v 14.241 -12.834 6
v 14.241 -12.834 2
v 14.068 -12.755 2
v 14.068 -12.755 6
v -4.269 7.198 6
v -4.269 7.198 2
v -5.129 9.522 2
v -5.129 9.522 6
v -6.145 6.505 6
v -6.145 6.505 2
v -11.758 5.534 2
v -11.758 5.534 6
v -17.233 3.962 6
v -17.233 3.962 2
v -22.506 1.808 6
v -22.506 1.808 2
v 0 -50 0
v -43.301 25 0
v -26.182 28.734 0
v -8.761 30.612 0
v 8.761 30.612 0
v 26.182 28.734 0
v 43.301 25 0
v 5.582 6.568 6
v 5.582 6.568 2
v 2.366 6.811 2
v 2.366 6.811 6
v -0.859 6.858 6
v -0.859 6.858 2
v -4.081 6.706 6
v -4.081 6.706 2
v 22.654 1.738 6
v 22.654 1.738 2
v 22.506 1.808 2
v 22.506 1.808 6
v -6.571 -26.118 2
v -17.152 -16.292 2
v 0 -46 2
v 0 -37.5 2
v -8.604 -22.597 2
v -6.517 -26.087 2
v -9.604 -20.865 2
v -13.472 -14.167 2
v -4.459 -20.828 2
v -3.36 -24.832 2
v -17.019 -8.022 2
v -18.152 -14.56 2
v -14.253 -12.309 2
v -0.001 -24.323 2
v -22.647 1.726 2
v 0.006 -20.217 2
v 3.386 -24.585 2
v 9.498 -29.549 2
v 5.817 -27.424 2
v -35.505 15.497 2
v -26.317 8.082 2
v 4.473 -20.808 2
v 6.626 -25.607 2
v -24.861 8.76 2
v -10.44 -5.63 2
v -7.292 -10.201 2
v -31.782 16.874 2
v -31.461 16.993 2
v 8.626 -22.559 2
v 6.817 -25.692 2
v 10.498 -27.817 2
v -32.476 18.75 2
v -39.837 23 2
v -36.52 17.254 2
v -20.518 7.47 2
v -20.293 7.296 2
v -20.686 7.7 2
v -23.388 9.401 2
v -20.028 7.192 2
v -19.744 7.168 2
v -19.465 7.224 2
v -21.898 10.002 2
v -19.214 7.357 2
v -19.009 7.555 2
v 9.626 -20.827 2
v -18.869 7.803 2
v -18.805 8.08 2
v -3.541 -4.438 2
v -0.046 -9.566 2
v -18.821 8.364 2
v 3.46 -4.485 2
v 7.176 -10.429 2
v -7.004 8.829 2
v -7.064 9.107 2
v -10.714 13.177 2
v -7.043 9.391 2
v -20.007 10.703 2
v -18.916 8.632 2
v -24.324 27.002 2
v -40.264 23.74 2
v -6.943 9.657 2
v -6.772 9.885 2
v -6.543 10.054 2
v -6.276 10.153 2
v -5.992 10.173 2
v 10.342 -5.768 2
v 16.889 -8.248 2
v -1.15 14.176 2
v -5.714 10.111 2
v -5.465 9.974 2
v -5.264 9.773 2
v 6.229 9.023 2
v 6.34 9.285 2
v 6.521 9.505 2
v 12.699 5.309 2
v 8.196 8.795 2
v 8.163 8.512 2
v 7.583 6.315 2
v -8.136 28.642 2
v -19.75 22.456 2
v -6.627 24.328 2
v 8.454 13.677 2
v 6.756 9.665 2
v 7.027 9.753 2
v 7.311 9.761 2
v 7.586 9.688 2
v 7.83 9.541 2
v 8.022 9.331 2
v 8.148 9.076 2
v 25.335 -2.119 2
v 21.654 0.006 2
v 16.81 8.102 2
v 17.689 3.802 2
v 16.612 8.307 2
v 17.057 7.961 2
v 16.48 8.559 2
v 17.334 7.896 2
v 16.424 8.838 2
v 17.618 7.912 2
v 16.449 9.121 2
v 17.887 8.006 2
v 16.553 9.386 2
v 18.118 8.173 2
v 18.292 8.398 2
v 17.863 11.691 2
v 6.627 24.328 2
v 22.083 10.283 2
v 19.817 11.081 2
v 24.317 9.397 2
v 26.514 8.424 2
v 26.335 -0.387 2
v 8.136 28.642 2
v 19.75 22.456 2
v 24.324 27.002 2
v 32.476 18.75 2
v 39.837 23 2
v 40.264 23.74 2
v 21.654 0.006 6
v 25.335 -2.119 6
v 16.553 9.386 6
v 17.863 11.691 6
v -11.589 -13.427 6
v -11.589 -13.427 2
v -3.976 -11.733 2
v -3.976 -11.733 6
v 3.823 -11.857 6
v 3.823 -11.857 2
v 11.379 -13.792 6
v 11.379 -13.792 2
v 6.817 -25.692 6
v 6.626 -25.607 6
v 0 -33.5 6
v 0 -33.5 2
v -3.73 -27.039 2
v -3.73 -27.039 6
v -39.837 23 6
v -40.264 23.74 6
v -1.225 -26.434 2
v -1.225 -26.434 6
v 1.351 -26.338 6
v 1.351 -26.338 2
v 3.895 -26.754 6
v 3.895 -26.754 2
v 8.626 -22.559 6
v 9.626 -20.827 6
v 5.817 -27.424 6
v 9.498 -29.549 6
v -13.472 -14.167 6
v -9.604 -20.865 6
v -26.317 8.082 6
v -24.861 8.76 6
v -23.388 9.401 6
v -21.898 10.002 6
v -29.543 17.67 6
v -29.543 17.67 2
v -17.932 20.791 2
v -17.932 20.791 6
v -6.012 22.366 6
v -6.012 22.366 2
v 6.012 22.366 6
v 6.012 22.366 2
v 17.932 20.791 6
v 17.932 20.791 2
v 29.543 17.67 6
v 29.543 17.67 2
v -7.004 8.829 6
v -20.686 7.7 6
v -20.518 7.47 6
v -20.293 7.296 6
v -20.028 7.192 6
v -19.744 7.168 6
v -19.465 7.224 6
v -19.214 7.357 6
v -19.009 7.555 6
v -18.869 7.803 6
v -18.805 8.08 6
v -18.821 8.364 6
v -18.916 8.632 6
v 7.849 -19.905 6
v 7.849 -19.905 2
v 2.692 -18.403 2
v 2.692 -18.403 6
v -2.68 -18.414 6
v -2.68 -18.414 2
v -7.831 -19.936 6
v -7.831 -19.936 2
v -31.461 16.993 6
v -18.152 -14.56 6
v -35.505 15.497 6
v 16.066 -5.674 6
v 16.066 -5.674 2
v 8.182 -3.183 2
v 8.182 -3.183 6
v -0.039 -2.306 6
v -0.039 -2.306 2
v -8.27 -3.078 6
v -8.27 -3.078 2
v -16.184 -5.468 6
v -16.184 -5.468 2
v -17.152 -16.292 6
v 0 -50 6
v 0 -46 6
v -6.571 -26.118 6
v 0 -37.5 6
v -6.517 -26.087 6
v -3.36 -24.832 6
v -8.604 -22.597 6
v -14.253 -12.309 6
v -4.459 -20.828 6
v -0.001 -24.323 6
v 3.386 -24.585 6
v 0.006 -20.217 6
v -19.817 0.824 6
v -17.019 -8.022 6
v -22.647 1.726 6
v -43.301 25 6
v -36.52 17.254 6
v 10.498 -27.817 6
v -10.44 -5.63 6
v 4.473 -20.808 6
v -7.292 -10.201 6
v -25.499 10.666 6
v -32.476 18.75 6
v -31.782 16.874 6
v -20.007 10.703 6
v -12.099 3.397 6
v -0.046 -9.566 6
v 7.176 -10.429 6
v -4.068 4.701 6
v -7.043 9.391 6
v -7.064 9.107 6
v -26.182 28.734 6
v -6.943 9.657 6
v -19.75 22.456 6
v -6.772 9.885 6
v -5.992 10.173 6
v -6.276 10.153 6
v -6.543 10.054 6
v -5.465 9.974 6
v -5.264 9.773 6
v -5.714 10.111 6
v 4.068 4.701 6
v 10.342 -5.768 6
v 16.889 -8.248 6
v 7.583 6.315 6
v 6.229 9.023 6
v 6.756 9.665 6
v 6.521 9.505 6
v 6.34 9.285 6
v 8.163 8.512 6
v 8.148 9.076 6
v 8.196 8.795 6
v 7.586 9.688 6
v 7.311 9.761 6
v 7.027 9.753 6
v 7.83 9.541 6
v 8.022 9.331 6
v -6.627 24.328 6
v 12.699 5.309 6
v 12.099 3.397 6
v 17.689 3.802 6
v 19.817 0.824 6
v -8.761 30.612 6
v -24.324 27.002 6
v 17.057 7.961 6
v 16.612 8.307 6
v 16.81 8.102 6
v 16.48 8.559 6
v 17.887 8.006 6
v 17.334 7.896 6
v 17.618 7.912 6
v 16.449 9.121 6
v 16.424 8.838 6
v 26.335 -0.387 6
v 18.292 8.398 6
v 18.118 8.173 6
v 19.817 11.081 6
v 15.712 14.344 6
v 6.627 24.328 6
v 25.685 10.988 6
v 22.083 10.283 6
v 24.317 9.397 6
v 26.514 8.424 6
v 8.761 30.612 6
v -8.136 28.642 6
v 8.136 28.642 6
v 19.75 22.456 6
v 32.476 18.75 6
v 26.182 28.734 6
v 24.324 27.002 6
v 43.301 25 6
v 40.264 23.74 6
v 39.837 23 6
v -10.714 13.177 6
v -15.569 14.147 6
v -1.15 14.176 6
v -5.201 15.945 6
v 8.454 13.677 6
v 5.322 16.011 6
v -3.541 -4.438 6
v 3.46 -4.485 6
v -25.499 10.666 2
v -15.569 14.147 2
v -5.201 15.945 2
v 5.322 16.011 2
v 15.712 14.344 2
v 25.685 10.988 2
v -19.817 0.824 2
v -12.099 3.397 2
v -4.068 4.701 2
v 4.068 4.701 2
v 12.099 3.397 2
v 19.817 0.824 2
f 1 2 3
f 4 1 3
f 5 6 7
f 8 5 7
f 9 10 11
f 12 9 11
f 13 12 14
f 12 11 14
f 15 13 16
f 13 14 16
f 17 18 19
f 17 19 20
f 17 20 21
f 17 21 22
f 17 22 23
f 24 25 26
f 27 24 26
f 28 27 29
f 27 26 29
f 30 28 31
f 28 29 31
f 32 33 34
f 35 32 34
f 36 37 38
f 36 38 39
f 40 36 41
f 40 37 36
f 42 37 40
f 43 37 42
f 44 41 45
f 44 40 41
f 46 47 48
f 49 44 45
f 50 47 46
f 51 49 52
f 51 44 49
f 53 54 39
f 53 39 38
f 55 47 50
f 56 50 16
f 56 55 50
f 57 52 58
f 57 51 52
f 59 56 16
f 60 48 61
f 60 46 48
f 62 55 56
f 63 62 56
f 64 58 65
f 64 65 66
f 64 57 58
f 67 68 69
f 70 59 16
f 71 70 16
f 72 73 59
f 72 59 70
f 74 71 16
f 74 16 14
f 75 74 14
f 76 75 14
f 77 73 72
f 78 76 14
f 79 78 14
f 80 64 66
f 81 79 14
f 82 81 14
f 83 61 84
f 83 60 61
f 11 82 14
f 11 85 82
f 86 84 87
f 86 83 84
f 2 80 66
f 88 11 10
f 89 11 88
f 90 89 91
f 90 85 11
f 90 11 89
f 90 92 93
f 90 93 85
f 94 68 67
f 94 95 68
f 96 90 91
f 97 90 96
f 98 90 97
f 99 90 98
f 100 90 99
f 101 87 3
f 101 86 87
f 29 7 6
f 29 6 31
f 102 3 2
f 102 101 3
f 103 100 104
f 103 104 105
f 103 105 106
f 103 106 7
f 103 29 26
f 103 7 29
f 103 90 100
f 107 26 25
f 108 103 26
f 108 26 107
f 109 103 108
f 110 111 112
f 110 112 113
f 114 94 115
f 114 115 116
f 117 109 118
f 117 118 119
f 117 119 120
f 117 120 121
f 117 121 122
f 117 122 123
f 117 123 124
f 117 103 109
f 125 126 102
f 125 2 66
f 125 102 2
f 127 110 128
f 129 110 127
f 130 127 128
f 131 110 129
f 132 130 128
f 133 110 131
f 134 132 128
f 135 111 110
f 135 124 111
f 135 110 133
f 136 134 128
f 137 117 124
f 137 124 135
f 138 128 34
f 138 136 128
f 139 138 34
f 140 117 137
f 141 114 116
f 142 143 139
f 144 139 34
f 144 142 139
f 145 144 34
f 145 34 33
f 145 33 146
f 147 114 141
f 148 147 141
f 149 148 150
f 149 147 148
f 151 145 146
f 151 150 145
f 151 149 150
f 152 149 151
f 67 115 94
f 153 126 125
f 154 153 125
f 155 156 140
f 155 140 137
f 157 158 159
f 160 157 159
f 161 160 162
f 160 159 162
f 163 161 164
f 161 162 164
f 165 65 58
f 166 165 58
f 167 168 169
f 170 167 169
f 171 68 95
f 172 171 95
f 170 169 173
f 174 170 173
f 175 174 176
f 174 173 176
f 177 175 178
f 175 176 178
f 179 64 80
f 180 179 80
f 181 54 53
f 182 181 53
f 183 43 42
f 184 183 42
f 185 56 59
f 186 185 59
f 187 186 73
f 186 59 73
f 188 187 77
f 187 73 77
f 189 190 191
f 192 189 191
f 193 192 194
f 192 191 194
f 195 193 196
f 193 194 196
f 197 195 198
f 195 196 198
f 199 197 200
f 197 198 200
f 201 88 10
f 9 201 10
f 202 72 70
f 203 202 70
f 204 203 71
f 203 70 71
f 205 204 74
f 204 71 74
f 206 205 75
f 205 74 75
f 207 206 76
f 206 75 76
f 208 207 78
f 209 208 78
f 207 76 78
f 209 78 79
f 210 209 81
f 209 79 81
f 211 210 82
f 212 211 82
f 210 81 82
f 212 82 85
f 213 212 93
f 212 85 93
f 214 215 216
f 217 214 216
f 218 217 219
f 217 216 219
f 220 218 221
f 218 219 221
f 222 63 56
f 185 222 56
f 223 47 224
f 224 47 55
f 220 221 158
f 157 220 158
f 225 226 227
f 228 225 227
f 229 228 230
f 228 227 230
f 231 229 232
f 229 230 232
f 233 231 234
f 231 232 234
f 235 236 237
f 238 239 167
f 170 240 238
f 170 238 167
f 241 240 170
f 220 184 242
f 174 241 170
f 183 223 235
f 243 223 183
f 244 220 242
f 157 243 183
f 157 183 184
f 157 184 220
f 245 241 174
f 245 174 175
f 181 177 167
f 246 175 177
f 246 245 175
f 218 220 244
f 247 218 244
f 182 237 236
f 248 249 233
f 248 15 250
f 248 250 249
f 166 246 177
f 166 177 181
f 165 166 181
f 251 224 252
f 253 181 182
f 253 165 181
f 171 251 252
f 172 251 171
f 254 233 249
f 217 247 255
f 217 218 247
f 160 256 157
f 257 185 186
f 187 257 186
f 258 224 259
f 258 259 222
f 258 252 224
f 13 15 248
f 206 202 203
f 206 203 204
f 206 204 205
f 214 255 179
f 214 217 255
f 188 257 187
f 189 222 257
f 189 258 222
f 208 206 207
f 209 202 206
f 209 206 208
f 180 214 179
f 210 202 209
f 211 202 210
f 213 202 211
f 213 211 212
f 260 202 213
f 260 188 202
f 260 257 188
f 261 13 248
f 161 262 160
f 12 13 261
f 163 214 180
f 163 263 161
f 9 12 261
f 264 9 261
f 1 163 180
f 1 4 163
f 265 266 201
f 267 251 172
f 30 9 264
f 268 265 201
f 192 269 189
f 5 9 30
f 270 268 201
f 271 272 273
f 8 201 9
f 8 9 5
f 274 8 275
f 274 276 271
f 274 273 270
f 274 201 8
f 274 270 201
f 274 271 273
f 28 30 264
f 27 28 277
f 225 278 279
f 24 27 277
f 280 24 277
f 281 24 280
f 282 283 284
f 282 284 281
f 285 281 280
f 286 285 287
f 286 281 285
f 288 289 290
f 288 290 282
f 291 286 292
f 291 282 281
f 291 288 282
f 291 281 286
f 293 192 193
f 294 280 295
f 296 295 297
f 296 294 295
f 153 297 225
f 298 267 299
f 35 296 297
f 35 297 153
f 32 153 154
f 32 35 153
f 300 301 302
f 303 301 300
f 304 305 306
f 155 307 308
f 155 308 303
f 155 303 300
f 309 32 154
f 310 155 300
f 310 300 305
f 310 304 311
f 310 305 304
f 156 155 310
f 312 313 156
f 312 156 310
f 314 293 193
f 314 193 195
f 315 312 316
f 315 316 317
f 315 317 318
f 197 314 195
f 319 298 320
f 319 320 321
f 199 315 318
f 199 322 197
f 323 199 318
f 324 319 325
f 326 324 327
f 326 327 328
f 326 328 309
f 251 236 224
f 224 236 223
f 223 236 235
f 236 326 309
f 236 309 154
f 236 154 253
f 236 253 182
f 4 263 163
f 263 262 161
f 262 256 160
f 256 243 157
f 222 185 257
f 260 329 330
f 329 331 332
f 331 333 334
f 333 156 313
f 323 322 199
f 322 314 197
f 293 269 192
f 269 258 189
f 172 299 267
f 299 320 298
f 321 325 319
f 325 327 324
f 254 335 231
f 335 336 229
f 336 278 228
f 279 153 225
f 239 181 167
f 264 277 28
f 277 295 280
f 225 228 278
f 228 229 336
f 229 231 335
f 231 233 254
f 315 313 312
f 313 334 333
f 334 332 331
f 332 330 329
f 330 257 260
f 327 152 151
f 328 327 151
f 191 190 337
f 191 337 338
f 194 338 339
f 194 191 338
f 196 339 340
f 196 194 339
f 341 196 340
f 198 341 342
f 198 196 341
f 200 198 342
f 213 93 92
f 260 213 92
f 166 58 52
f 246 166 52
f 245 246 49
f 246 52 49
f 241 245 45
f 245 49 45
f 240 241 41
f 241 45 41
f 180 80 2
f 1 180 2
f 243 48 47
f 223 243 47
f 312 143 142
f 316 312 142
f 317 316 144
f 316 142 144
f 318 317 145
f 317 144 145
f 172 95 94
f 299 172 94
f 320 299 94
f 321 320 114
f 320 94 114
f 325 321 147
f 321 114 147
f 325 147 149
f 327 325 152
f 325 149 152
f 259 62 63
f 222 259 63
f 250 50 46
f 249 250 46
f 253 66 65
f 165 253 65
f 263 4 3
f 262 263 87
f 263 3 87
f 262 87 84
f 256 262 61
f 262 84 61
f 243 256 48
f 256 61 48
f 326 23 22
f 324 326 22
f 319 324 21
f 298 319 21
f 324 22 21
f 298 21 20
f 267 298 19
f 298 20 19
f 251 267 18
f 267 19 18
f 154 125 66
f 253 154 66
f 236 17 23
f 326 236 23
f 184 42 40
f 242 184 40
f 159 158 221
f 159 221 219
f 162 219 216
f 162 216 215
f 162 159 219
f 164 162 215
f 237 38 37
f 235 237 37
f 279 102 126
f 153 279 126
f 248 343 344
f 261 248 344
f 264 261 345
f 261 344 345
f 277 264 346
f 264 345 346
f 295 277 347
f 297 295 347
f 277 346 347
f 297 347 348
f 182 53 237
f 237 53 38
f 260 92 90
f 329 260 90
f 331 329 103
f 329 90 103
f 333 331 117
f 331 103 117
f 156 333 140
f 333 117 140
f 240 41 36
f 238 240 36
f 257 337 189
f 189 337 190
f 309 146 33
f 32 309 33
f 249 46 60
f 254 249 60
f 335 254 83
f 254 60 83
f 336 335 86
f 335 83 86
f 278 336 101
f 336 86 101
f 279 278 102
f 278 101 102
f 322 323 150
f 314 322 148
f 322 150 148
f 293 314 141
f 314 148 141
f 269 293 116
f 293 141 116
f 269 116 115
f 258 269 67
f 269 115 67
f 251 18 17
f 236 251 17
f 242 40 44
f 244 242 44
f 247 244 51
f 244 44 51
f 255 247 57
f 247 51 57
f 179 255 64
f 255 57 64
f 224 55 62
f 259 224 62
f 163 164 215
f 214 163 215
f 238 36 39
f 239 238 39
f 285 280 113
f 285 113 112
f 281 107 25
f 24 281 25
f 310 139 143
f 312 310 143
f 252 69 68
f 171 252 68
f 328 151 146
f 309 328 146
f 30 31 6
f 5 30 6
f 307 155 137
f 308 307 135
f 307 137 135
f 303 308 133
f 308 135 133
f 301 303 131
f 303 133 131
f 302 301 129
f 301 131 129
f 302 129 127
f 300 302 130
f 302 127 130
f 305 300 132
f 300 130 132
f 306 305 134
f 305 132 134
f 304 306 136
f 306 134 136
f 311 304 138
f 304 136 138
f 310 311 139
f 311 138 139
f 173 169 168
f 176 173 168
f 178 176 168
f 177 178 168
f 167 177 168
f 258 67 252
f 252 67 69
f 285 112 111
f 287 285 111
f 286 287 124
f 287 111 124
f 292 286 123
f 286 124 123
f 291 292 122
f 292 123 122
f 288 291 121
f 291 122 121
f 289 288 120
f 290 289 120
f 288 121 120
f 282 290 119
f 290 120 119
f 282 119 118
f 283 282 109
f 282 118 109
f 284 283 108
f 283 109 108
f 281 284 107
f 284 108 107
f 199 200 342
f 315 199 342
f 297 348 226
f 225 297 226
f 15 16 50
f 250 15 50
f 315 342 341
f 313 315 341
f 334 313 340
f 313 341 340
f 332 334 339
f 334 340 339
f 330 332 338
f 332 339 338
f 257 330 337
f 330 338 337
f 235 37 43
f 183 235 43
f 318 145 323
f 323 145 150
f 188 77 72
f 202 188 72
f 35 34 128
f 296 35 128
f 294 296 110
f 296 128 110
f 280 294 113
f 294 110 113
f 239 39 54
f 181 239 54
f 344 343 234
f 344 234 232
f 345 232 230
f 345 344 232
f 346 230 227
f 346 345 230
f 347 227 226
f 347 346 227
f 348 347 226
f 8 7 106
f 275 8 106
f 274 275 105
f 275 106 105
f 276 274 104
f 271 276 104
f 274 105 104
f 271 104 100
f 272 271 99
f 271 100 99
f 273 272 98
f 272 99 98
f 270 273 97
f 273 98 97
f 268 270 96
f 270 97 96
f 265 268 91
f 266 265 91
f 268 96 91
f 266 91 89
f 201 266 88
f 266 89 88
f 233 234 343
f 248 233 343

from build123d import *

# Parameters (mm, degrees)
F1_DEPTH = 6
F3_DEPTH = 2


with BuildPart() as f1:
    # F0 (on Top) → F1 (new body)
    with BuildSketch(Plane.XY):
        with BuildLine():
            Line((-43.30127, 25), (0, -50))
            Line((0, -50), (43.30127, 25))
            ThreePointArc((43.30127, 25), (0, 30.847641), (-43.30127, 25))
        make_face()
        with BuildLine():
            ThreePointArc((-11.589333, -13.426687), (-0.072865, -11.565377), (11.378667, -13.79157))
            Line((11.378667, -13.79157), (7.849282, -19.904644))
            ThreePointArc((7.849282, -19.904644), (0.005562, -18.216828), (-7.831448, -19.935535))
            Line((-7.831448, -19.935535), (-11.589333, -13.426687))
        make_face(mode=Mode.SUBTRACT)
        with BuildLine():
            ThreePointArc((-3.730163, -27.039168), (0.060809, -26.321755), (3.894771, -26.754059))
            Line((3.894771, -26.754059), (0, -33.5))
            Line((0, -33.5), (-3.730163, -27.039168))
        make_face(mode=Mode.SUBTRACT)
        with BuildLine():
            Line((9.497942, -29.549082), (0, -46))
            Line((0, -46), (-17.152136, -16.291628))
            Line((-17.152136, -16.291628), (-13.471529, -14.166628))
            Line((-13.471529, -14.166628), (-9.604325, -20.864822))
            Line((-9.604325, -20.864822), (-8.604242, -22.597016))
            ThreePointArc((-8.604242, -22.597016), (0.00573, -20.216832), (8.626059, -22.559227))
            Line((8.626059, -22.559227), (9.626098, -20.82711))
            Line((9.626098, -20.82711), (14.241089, -12.833711))
            Line((14.241089, -12.833711), (14.067922, -12.754568))
            ThreePointArc((14.067922, -12.754568), (-0.045906, -9.565553), (-14.253164, -12.308505))
            Line((-14.253164, -12.308505), (-18.152136, -14.559577))
            Line((-18.152136, -14.559577), (-35.505424, 15.497198))
            Line((-35.505424, 15.497198), (-31.782206, 16.874176))
            Line((-31.782206, 16.874176), (-31.461437, 16.992808))
            Line((-31.461437, 16.992808), (-26.316707, 8.081874))
            ThreePointArc((-26.316707, 8.081874), (-24.126261, 9.085191), (-21.898303, 10.0022))
            Line((-21.898303, 10.0022), (-20.685559, 7.700137))
            ThreePointArc((-20.685559, 7.700137), (-19.334733, 7.281486), (-18.916081, 8.632312))
            Line((-18.916081, 8.632312), (-20.006684, 10.702522))
            ThreePointArc((-20.006684, 10.702522), (-1.149596, 14.176087), (17.863047, 11.691171))
            Line((17.863047, 11.691171), (16.553134, 9.386264))
            ThreePointArc((16.553134, 9.386264), (16.928445, 8.022761), (18.291948, 8.398071))
            Line((18.291948, 8.398071), (19.816809, 11.081198))
            ThreePointArc((19.816809, 11.081198), (23.204445, 9.850646), (26.514425, 8.424332))
            Line((26.514425, 8.424332), (32.475953, 18.75))
            ThreePointArc((32.475953, 18.75), (0, 24.562976), (-32.475953, 18.75))
            Line((-32.475953, 18.75), (-36.519939, 17.25439))
            Line((-36.519939, 17.25439), (-39.837169, 23))
            Line((-39.837169, 23), (-40.264169, 23.739586))
            ThreePointArc((-40.264169, 23.739586), (0, 28.847641), (40.264169, 23.739586))
            Line((40.264169, 23.739586), (39.837169, 23))
            Line((39.837169, 23), (26.334579, -0.387172))
            Line((26.334579, -0.387172), (22.653971, 1.737828))
            Line((22.653971, 1.737828), (22.506193, 1.807767))
            ThreePointArc((22.506193, 1.807767), (15.212654, 4.617264), (7.583376, 6.315231))
            Line((7.583376, 6.315231), (8.163141, 8.512388))
            ThreePointArc((8.163141, 8.512388), (7.451374, 9.734431), (6.229331, 9.022663))
            Line((6.229331, 9.022663), (5.581544, 6.567719))
            ThreePointArc((5.581544, 6.567719), (0.753566, 6.859231), (-4.080781, 6.706128))
            Line((-4.080781, 6.706128), (-4.26912, 7.198283))
            Line((-4.26912, 7.198283), (-5.12863, 9.522317))
            ThreePointArc((-5.12863, 9.522317), (-6.413415, 10.113356), (-7.004454, 8.828571))
            Line((-7.004454, 8.828571), (-6.144944, 6.504537))
            ThreePointArc((-6.144944, 6.504537), (-14.516777, 4.82223), (-22.506193, 1.807767))
            Line((-22.506193, 1.807767), (-22.647311, 1.726292))
            Line((-22.647311, 1.726292), (-17.019315, -8.021681))
            ThreePointArc((-17.019315, -8.021681), (-0.039752, -4.305799), (16.88873, -8.247861))
            Line((16.88873, -8.247861), (21.653971, 0.005778))
            Line((21.653971, 0.005778), (25.334579, -2.119222))
            Line((25.334579, -2.119222), (10.497942, -27.817031))
            Line((10.497942, -27.817031), (6.817334, -25.692031))
            Line((6.817334, -25.692031), (6.626115, -25.606798))
            ThreePointArc((6.626115, -25.606798), (-0.001194, -24.322681), (-6.517118, -26.087024))
            Line((-6.517118, -26.087024), (-6.571243, -26.118273))
            Line((-6.571243, -26.118273), (0, -37.5))
            Line((0, -37.5), (5.817334, -27.424082))
            Line((5.817334, -27.424082), (9.497942, -29.549082))
        make_face(mode=Mode.SUBTRACT)
        with BuildLine():
            ThreePointArc((-19.816809, 0.823719), (0, 4.864628), (19.816809, 0.823719))
            Line((19.816809, 0.823719), (16.065514, -5.673714))
            ThreePointArc((16.065514, -5.673714), (-0.03855, -2.305764), (-16.18426, -5.46804))
            Line((-16.18426, -5.46804), (-19.816809, 0.823719))
        make_face(mode=Mode.SUBTRACT)
        with BuildLine():
            Line((29.542751, 17.669546), (25.685216, 10.988099))
            ThreePointArc((25.685216, 10.988099), (0.059225, 16.195833), (-25.499161, 10.665842))
            Line((-25.499161, 10.665842), (-29.542751, 17.669546))
            ThreePointArc((-29.542751, 17.669546), (0, 22.562976), (29.542751, 17.669546))
        make_face(mode=Mode.SUBTRACT)
    extrude(amount=F1_DEPTH)

    # F2 (on Top) → F3 (join)
    with BuildSketch(Plane.XY):
        with BuildLine():
            Line((-43.30127, 25), (0, -50))
            Line((0, -50), (43.30127, 25))
            ThreePointArc((43.30127, 25), (0, 30.847641), (-43.30127, 25))
        make_face()
    extrude(amount=F3_DEPTH)


solid = f1.part
